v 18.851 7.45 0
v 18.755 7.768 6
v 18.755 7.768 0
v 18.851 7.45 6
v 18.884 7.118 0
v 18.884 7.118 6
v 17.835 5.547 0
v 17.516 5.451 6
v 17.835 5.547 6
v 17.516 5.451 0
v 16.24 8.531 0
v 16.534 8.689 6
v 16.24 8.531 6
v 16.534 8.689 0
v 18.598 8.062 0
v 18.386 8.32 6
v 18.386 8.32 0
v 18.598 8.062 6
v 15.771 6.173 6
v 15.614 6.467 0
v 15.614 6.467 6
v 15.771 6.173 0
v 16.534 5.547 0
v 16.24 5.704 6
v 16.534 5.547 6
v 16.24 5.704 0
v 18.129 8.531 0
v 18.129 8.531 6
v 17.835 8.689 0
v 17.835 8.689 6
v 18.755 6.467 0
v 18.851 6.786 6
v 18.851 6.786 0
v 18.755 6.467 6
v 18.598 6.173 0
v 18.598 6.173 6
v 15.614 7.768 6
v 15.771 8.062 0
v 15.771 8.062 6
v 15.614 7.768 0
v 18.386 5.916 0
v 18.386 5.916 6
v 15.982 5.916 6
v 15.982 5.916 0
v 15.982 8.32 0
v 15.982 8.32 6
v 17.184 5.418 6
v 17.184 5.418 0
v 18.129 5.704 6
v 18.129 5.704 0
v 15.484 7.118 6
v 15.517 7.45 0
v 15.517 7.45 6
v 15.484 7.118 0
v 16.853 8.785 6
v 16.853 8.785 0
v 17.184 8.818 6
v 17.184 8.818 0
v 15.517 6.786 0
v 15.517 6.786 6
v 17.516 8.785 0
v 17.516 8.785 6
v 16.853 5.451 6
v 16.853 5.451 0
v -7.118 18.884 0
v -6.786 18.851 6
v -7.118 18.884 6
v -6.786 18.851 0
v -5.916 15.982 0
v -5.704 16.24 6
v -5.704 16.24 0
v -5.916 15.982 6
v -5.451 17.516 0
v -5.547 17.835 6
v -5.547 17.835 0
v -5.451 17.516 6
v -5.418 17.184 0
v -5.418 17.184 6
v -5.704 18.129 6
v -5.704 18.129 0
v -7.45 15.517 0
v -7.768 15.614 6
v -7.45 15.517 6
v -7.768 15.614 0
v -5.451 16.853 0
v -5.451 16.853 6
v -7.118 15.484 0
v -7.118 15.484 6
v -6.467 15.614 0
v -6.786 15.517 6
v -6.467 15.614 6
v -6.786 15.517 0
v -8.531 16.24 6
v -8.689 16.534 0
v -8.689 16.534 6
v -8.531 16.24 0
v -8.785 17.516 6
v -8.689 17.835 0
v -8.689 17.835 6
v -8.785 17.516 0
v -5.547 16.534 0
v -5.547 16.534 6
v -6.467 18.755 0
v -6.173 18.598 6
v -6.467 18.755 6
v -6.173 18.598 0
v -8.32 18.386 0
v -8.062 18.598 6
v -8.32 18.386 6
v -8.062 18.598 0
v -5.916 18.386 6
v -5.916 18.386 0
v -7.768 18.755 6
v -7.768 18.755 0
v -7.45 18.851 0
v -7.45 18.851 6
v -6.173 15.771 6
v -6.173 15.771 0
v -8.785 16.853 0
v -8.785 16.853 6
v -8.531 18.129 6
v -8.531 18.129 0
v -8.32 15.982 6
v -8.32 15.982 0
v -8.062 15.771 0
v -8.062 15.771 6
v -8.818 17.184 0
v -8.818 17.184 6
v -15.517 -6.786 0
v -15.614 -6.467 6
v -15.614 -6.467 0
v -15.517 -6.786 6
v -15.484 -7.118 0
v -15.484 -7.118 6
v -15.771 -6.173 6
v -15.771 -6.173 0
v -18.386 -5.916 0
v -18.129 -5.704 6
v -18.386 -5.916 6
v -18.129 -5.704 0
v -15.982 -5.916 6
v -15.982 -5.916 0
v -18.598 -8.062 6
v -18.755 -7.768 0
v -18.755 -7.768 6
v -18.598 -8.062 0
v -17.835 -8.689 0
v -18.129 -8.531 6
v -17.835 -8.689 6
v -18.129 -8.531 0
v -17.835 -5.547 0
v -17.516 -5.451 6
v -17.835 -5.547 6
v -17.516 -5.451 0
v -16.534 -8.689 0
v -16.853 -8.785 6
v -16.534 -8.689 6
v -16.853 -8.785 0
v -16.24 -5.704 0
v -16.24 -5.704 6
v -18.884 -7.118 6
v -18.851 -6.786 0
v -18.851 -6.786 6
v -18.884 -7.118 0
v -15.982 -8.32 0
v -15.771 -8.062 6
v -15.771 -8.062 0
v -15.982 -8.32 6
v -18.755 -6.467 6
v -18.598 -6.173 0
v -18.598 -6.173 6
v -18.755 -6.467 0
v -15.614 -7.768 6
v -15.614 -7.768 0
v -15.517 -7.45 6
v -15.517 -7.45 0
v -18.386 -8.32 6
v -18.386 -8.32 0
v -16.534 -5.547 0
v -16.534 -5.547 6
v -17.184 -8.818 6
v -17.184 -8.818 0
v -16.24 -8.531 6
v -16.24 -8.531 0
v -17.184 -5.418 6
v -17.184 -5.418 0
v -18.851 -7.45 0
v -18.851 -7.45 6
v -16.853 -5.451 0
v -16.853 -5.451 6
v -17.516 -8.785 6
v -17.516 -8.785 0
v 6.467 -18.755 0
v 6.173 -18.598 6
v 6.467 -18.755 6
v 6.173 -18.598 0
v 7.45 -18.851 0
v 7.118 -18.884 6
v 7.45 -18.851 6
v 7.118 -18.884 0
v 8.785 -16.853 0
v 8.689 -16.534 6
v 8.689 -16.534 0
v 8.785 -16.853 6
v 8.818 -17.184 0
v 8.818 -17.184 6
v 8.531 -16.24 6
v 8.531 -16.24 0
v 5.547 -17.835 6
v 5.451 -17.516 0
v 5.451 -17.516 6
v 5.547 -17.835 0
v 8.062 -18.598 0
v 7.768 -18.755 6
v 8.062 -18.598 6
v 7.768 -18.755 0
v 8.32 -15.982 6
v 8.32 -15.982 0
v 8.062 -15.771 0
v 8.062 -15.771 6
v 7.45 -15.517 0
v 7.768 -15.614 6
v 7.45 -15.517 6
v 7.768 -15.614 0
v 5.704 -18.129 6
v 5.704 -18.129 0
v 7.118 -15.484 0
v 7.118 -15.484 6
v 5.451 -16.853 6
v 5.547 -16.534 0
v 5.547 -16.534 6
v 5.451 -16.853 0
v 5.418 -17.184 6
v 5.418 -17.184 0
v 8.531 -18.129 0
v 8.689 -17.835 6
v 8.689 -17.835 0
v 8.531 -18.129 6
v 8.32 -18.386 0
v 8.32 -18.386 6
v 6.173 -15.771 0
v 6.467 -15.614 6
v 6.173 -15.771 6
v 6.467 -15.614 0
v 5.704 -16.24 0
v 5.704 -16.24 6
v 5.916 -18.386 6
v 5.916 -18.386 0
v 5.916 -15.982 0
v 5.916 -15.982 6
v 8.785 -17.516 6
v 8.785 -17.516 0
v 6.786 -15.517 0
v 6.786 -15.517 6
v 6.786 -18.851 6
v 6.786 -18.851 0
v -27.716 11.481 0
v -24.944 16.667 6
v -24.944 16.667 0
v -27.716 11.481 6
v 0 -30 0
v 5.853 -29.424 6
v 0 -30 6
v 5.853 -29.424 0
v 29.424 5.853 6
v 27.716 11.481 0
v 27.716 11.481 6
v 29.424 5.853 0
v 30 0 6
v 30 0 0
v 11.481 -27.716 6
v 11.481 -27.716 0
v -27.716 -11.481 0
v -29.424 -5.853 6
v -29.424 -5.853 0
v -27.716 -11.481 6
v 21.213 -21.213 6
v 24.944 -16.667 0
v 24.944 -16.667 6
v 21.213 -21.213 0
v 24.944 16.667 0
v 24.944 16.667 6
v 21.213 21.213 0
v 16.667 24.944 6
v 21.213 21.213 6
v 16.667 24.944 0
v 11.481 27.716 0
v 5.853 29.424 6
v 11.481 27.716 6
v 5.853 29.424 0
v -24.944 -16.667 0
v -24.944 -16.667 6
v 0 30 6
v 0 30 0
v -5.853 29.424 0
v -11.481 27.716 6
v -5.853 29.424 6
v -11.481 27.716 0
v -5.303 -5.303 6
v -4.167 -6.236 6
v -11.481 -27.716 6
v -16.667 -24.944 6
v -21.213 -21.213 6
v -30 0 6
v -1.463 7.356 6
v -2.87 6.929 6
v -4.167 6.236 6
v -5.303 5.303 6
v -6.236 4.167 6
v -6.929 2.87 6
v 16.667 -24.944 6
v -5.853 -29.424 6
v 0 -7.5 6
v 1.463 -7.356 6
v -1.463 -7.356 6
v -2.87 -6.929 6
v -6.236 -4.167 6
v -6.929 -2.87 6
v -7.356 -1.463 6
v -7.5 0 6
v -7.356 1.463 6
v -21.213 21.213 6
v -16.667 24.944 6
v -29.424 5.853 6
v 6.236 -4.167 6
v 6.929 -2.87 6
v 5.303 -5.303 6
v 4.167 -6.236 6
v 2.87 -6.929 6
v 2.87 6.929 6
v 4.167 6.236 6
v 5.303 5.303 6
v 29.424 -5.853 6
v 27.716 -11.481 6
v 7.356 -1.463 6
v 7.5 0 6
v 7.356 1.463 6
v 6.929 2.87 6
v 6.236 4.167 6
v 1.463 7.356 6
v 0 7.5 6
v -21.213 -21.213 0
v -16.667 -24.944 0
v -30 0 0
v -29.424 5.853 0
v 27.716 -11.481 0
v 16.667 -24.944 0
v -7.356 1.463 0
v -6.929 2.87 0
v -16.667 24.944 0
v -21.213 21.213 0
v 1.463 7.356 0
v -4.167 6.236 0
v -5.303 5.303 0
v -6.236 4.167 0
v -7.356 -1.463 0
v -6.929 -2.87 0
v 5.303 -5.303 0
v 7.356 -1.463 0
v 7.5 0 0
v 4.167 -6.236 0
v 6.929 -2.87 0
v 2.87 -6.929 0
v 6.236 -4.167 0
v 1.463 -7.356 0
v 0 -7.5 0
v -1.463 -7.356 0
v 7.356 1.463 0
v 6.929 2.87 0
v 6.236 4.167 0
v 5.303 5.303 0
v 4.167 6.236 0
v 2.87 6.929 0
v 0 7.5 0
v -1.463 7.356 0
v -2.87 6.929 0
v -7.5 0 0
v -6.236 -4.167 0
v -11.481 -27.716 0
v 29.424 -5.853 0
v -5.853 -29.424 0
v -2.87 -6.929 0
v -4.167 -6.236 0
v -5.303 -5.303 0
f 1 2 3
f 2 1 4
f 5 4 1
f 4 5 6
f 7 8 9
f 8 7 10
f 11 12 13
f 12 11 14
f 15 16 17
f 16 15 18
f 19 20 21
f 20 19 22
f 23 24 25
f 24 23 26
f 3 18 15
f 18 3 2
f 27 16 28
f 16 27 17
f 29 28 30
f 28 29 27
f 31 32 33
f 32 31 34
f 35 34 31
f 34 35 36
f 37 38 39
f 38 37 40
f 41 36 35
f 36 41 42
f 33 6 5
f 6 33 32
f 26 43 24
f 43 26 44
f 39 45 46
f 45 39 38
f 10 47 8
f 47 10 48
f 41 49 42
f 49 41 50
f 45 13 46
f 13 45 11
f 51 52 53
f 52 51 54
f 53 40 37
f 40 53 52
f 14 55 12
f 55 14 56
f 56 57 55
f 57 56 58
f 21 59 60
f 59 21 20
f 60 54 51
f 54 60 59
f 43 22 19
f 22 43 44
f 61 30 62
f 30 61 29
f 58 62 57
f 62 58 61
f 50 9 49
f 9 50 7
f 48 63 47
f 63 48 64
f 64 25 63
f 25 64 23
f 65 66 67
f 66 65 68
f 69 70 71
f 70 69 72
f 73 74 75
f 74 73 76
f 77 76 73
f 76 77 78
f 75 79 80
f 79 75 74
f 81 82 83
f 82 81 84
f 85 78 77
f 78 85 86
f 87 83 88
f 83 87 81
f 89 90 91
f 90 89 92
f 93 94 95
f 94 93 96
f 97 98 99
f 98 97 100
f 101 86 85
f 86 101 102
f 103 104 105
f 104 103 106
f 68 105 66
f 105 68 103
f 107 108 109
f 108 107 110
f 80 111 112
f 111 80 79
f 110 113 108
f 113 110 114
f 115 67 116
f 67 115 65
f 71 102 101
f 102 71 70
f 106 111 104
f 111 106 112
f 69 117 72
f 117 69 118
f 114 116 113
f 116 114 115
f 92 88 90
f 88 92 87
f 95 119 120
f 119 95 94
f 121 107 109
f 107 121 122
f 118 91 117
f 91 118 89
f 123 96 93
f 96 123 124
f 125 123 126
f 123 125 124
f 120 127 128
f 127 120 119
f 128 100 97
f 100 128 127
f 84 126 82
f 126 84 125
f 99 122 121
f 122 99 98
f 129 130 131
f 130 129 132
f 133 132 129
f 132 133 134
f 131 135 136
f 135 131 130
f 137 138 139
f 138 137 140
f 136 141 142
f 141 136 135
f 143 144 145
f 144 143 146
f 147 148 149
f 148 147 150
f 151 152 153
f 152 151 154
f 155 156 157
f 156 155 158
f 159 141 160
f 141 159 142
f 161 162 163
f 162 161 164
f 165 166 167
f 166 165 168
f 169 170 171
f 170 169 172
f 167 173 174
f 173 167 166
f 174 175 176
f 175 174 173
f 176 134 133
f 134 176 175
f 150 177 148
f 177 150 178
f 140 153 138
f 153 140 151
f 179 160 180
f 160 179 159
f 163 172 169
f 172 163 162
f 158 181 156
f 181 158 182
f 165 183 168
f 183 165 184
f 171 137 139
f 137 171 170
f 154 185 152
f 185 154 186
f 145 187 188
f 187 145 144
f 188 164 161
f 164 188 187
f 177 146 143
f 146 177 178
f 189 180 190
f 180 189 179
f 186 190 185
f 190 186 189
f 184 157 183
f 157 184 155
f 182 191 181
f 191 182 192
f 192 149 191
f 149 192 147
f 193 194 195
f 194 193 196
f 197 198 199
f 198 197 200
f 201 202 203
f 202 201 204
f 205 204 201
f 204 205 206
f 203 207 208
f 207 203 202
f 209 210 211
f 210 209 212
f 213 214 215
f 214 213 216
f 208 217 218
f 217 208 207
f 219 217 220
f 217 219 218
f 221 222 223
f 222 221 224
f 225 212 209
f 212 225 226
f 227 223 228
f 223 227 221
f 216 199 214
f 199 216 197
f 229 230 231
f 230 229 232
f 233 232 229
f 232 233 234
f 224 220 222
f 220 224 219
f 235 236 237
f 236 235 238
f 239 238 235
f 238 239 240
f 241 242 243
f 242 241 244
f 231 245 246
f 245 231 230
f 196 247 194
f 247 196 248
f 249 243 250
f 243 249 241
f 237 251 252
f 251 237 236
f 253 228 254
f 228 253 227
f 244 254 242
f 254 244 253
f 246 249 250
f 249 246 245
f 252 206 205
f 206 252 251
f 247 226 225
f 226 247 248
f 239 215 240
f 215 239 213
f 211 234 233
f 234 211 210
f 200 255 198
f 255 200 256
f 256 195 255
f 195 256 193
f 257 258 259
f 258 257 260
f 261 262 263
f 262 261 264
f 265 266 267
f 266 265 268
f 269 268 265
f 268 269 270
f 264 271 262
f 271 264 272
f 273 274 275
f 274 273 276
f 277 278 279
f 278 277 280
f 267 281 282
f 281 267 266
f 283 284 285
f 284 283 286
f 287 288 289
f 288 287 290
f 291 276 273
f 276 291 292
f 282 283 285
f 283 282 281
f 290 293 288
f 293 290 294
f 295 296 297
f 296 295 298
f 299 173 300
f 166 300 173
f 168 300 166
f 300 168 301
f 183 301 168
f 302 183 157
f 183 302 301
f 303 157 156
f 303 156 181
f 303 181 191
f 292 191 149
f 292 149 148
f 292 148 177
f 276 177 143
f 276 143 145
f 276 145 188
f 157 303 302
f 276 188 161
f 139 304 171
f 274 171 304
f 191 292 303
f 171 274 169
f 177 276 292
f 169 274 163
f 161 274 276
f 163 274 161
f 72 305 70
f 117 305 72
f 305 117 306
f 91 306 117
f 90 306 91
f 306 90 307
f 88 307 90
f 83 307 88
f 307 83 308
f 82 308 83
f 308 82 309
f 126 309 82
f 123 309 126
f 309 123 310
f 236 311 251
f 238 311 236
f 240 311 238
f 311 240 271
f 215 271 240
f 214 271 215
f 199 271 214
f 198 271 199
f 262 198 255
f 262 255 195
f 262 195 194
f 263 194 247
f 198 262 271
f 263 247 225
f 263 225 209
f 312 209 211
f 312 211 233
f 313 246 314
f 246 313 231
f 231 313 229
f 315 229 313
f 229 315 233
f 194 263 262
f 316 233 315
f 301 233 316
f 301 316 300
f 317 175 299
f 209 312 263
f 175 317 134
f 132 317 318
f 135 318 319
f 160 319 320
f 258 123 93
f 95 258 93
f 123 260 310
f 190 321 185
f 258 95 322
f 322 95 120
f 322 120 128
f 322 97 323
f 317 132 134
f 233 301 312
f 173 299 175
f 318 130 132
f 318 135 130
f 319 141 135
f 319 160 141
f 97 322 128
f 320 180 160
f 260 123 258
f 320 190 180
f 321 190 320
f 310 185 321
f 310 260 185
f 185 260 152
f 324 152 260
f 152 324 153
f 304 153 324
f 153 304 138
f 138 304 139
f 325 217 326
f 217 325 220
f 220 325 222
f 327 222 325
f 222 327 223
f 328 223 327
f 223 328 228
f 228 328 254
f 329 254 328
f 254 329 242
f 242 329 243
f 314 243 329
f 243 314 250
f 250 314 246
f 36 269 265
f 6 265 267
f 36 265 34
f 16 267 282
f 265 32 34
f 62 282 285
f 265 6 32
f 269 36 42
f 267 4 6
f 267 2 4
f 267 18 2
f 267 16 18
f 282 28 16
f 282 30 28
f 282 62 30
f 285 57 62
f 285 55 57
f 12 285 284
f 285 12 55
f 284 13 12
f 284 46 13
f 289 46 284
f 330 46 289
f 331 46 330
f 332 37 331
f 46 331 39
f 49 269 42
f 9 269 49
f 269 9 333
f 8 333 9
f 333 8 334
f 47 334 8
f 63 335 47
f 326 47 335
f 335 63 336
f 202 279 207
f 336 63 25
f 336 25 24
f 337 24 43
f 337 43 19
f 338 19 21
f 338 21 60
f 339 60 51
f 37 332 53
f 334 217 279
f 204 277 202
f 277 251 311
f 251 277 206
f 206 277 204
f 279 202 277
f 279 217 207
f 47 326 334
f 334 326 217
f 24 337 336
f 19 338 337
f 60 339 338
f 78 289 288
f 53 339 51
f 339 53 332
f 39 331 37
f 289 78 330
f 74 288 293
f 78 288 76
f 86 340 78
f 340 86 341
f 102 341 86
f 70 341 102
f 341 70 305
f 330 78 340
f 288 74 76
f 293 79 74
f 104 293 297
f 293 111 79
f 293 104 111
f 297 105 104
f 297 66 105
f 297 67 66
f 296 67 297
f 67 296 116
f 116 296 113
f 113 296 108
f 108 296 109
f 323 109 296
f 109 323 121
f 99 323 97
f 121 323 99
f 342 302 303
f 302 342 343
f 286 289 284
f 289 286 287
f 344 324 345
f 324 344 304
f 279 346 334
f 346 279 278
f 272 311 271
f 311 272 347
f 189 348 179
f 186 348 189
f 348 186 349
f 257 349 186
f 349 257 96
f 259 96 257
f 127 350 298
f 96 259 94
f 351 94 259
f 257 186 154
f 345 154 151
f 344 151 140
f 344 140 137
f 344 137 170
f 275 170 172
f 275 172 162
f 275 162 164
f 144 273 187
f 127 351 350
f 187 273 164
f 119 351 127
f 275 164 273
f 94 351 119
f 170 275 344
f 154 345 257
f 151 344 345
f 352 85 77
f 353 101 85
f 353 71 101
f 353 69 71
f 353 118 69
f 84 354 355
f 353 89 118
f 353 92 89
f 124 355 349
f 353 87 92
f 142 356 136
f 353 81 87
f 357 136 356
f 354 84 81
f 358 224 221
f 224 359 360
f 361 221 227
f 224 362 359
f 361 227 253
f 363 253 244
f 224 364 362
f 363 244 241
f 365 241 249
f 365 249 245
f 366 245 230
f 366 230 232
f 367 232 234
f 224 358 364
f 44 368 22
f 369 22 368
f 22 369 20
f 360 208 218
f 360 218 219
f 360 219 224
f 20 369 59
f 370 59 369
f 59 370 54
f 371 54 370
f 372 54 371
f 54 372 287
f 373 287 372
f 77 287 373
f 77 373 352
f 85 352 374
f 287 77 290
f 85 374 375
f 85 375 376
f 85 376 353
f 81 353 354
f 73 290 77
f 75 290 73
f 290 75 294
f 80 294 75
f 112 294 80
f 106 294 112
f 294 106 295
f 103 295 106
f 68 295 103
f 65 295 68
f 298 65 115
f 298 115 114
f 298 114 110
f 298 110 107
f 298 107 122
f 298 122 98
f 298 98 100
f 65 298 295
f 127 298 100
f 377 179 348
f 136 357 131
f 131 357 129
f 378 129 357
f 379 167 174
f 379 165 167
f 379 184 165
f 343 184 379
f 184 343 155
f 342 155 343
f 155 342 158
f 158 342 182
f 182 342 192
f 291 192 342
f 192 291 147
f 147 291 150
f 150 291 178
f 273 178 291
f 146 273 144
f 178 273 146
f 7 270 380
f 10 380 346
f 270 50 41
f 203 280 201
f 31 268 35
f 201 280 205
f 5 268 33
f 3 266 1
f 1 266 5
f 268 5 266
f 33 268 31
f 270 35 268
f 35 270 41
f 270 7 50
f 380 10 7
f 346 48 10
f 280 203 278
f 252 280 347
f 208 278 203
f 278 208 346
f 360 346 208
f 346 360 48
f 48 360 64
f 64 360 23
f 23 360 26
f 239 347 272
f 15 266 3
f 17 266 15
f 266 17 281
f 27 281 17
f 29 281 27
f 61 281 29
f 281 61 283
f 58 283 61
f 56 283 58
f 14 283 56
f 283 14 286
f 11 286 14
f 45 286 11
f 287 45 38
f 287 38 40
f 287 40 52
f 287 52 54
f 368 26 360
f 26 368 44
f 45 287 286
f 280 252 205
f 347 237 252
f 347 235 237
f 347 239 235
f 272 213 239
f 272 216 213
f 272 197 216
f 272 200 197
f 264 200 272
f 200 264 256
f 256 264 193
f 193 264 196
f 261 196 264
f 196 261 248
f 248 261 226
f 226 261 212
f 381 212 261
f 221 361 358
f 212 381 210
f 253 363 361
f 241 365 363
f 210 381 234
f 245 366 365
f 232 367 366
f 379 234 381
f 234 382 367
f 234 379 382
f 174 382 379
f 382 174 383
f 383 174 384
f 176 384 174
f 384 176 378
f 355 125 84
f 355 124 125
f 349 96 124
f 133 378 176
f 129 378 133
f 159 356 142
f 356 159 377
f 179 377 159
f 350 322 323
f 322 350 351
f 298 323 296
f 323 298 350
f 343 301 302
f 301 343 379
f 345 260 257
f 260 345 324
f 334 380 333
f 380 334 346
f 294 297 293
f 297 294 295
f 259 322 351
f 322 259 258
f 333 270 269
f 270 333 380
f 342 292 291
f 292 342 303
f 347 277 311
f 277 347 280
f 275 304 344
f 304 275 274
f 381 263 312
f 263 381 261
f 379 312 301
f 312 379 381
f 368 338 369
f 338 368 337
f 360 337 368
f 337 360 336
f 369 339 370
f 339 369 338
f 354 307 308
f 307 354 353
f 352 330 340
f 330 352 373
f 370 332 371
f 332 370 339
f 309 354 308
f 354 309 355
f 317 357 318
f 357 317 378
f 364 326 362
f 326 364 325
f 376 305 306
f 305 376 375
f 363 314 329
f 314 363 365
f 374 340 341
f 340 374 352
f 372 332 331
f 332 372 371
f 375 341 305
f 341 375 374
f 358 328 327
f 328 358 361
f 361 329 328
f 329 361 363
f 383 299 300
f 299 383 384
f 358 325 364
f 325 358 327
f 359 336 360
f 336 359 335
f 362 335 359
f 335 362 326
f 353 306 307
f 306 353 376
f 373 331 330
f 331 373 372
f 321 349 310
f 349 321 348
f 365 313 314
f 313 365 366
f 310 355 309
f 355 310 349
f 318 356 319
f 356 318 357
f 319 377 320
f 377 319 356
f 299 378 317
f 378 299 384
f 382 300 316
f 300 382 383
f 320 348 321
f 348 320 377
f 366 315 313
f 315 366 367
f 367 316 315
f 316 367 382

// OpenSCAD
$fn = 32;

// ----------------------------------------------------------------------
// Flange Ø60 x 6
// 4 holes on a Ø37.2 bolt circle, bolted joints
// ----------------------------------------------------------------------

// --- parameters (mm) ---
flange_d = 60;     // outside diameter of the flange
thickness = 6;     // flange thickness
holes = 4;         // number of bolt holes
pcd = 37.2;        // bolt circle diameter
start_deg = 22.5;  // angle of the first hole, from +X
hole_d = 3.4;      // bolt hole diameter
bore_d = 15;       // central through bore
hub_d = 27;        // hub outside diameter
hub_h = 0;         // hub height above the flange face (0 = no hub)

// --- derived feature positions (mm) ---
height = thickness + hub_h;  // = 6   overall height of the part
pcd_r = pcd / 2;             // = 18.6   bolt circle radius
hole_step = 360 / holes;     // = 90   angular pitch
feature_centers = [
  [pcd_r * cos(start_deg + 0 * hole_step), pcd_r * sin(start_deg + 0 * hole_step)],
  [pcd_r * cos(start_deg + 1 * hole_step), pcd_r * sin(start_deg + 1 * hole_step)],
  [pcd_r * cos(start_deg + 2 * hole_step), pcd_r * sin(start_deg + 2 * hole_step)],
  [pcd_r * cos(start_deg + 3 * hole_step), pcd_r * sin(start_deg + 3 * hole_step)]
];   // bolt hole centres on the pitch circle

// flange disc, every hole and the bore cut straight through
difference() {
  union() {
    cylinder(d = flange_d, h = thickness);
  }
  translate([0, 0, -1]) cylinder(d = bore_d, h = height + 2);  // bore, through
  for (centre = feature_centers)
    translate([centre[0], centre[1], -1]) cylinder(d = hole_d, h = thickness + 2);
}
